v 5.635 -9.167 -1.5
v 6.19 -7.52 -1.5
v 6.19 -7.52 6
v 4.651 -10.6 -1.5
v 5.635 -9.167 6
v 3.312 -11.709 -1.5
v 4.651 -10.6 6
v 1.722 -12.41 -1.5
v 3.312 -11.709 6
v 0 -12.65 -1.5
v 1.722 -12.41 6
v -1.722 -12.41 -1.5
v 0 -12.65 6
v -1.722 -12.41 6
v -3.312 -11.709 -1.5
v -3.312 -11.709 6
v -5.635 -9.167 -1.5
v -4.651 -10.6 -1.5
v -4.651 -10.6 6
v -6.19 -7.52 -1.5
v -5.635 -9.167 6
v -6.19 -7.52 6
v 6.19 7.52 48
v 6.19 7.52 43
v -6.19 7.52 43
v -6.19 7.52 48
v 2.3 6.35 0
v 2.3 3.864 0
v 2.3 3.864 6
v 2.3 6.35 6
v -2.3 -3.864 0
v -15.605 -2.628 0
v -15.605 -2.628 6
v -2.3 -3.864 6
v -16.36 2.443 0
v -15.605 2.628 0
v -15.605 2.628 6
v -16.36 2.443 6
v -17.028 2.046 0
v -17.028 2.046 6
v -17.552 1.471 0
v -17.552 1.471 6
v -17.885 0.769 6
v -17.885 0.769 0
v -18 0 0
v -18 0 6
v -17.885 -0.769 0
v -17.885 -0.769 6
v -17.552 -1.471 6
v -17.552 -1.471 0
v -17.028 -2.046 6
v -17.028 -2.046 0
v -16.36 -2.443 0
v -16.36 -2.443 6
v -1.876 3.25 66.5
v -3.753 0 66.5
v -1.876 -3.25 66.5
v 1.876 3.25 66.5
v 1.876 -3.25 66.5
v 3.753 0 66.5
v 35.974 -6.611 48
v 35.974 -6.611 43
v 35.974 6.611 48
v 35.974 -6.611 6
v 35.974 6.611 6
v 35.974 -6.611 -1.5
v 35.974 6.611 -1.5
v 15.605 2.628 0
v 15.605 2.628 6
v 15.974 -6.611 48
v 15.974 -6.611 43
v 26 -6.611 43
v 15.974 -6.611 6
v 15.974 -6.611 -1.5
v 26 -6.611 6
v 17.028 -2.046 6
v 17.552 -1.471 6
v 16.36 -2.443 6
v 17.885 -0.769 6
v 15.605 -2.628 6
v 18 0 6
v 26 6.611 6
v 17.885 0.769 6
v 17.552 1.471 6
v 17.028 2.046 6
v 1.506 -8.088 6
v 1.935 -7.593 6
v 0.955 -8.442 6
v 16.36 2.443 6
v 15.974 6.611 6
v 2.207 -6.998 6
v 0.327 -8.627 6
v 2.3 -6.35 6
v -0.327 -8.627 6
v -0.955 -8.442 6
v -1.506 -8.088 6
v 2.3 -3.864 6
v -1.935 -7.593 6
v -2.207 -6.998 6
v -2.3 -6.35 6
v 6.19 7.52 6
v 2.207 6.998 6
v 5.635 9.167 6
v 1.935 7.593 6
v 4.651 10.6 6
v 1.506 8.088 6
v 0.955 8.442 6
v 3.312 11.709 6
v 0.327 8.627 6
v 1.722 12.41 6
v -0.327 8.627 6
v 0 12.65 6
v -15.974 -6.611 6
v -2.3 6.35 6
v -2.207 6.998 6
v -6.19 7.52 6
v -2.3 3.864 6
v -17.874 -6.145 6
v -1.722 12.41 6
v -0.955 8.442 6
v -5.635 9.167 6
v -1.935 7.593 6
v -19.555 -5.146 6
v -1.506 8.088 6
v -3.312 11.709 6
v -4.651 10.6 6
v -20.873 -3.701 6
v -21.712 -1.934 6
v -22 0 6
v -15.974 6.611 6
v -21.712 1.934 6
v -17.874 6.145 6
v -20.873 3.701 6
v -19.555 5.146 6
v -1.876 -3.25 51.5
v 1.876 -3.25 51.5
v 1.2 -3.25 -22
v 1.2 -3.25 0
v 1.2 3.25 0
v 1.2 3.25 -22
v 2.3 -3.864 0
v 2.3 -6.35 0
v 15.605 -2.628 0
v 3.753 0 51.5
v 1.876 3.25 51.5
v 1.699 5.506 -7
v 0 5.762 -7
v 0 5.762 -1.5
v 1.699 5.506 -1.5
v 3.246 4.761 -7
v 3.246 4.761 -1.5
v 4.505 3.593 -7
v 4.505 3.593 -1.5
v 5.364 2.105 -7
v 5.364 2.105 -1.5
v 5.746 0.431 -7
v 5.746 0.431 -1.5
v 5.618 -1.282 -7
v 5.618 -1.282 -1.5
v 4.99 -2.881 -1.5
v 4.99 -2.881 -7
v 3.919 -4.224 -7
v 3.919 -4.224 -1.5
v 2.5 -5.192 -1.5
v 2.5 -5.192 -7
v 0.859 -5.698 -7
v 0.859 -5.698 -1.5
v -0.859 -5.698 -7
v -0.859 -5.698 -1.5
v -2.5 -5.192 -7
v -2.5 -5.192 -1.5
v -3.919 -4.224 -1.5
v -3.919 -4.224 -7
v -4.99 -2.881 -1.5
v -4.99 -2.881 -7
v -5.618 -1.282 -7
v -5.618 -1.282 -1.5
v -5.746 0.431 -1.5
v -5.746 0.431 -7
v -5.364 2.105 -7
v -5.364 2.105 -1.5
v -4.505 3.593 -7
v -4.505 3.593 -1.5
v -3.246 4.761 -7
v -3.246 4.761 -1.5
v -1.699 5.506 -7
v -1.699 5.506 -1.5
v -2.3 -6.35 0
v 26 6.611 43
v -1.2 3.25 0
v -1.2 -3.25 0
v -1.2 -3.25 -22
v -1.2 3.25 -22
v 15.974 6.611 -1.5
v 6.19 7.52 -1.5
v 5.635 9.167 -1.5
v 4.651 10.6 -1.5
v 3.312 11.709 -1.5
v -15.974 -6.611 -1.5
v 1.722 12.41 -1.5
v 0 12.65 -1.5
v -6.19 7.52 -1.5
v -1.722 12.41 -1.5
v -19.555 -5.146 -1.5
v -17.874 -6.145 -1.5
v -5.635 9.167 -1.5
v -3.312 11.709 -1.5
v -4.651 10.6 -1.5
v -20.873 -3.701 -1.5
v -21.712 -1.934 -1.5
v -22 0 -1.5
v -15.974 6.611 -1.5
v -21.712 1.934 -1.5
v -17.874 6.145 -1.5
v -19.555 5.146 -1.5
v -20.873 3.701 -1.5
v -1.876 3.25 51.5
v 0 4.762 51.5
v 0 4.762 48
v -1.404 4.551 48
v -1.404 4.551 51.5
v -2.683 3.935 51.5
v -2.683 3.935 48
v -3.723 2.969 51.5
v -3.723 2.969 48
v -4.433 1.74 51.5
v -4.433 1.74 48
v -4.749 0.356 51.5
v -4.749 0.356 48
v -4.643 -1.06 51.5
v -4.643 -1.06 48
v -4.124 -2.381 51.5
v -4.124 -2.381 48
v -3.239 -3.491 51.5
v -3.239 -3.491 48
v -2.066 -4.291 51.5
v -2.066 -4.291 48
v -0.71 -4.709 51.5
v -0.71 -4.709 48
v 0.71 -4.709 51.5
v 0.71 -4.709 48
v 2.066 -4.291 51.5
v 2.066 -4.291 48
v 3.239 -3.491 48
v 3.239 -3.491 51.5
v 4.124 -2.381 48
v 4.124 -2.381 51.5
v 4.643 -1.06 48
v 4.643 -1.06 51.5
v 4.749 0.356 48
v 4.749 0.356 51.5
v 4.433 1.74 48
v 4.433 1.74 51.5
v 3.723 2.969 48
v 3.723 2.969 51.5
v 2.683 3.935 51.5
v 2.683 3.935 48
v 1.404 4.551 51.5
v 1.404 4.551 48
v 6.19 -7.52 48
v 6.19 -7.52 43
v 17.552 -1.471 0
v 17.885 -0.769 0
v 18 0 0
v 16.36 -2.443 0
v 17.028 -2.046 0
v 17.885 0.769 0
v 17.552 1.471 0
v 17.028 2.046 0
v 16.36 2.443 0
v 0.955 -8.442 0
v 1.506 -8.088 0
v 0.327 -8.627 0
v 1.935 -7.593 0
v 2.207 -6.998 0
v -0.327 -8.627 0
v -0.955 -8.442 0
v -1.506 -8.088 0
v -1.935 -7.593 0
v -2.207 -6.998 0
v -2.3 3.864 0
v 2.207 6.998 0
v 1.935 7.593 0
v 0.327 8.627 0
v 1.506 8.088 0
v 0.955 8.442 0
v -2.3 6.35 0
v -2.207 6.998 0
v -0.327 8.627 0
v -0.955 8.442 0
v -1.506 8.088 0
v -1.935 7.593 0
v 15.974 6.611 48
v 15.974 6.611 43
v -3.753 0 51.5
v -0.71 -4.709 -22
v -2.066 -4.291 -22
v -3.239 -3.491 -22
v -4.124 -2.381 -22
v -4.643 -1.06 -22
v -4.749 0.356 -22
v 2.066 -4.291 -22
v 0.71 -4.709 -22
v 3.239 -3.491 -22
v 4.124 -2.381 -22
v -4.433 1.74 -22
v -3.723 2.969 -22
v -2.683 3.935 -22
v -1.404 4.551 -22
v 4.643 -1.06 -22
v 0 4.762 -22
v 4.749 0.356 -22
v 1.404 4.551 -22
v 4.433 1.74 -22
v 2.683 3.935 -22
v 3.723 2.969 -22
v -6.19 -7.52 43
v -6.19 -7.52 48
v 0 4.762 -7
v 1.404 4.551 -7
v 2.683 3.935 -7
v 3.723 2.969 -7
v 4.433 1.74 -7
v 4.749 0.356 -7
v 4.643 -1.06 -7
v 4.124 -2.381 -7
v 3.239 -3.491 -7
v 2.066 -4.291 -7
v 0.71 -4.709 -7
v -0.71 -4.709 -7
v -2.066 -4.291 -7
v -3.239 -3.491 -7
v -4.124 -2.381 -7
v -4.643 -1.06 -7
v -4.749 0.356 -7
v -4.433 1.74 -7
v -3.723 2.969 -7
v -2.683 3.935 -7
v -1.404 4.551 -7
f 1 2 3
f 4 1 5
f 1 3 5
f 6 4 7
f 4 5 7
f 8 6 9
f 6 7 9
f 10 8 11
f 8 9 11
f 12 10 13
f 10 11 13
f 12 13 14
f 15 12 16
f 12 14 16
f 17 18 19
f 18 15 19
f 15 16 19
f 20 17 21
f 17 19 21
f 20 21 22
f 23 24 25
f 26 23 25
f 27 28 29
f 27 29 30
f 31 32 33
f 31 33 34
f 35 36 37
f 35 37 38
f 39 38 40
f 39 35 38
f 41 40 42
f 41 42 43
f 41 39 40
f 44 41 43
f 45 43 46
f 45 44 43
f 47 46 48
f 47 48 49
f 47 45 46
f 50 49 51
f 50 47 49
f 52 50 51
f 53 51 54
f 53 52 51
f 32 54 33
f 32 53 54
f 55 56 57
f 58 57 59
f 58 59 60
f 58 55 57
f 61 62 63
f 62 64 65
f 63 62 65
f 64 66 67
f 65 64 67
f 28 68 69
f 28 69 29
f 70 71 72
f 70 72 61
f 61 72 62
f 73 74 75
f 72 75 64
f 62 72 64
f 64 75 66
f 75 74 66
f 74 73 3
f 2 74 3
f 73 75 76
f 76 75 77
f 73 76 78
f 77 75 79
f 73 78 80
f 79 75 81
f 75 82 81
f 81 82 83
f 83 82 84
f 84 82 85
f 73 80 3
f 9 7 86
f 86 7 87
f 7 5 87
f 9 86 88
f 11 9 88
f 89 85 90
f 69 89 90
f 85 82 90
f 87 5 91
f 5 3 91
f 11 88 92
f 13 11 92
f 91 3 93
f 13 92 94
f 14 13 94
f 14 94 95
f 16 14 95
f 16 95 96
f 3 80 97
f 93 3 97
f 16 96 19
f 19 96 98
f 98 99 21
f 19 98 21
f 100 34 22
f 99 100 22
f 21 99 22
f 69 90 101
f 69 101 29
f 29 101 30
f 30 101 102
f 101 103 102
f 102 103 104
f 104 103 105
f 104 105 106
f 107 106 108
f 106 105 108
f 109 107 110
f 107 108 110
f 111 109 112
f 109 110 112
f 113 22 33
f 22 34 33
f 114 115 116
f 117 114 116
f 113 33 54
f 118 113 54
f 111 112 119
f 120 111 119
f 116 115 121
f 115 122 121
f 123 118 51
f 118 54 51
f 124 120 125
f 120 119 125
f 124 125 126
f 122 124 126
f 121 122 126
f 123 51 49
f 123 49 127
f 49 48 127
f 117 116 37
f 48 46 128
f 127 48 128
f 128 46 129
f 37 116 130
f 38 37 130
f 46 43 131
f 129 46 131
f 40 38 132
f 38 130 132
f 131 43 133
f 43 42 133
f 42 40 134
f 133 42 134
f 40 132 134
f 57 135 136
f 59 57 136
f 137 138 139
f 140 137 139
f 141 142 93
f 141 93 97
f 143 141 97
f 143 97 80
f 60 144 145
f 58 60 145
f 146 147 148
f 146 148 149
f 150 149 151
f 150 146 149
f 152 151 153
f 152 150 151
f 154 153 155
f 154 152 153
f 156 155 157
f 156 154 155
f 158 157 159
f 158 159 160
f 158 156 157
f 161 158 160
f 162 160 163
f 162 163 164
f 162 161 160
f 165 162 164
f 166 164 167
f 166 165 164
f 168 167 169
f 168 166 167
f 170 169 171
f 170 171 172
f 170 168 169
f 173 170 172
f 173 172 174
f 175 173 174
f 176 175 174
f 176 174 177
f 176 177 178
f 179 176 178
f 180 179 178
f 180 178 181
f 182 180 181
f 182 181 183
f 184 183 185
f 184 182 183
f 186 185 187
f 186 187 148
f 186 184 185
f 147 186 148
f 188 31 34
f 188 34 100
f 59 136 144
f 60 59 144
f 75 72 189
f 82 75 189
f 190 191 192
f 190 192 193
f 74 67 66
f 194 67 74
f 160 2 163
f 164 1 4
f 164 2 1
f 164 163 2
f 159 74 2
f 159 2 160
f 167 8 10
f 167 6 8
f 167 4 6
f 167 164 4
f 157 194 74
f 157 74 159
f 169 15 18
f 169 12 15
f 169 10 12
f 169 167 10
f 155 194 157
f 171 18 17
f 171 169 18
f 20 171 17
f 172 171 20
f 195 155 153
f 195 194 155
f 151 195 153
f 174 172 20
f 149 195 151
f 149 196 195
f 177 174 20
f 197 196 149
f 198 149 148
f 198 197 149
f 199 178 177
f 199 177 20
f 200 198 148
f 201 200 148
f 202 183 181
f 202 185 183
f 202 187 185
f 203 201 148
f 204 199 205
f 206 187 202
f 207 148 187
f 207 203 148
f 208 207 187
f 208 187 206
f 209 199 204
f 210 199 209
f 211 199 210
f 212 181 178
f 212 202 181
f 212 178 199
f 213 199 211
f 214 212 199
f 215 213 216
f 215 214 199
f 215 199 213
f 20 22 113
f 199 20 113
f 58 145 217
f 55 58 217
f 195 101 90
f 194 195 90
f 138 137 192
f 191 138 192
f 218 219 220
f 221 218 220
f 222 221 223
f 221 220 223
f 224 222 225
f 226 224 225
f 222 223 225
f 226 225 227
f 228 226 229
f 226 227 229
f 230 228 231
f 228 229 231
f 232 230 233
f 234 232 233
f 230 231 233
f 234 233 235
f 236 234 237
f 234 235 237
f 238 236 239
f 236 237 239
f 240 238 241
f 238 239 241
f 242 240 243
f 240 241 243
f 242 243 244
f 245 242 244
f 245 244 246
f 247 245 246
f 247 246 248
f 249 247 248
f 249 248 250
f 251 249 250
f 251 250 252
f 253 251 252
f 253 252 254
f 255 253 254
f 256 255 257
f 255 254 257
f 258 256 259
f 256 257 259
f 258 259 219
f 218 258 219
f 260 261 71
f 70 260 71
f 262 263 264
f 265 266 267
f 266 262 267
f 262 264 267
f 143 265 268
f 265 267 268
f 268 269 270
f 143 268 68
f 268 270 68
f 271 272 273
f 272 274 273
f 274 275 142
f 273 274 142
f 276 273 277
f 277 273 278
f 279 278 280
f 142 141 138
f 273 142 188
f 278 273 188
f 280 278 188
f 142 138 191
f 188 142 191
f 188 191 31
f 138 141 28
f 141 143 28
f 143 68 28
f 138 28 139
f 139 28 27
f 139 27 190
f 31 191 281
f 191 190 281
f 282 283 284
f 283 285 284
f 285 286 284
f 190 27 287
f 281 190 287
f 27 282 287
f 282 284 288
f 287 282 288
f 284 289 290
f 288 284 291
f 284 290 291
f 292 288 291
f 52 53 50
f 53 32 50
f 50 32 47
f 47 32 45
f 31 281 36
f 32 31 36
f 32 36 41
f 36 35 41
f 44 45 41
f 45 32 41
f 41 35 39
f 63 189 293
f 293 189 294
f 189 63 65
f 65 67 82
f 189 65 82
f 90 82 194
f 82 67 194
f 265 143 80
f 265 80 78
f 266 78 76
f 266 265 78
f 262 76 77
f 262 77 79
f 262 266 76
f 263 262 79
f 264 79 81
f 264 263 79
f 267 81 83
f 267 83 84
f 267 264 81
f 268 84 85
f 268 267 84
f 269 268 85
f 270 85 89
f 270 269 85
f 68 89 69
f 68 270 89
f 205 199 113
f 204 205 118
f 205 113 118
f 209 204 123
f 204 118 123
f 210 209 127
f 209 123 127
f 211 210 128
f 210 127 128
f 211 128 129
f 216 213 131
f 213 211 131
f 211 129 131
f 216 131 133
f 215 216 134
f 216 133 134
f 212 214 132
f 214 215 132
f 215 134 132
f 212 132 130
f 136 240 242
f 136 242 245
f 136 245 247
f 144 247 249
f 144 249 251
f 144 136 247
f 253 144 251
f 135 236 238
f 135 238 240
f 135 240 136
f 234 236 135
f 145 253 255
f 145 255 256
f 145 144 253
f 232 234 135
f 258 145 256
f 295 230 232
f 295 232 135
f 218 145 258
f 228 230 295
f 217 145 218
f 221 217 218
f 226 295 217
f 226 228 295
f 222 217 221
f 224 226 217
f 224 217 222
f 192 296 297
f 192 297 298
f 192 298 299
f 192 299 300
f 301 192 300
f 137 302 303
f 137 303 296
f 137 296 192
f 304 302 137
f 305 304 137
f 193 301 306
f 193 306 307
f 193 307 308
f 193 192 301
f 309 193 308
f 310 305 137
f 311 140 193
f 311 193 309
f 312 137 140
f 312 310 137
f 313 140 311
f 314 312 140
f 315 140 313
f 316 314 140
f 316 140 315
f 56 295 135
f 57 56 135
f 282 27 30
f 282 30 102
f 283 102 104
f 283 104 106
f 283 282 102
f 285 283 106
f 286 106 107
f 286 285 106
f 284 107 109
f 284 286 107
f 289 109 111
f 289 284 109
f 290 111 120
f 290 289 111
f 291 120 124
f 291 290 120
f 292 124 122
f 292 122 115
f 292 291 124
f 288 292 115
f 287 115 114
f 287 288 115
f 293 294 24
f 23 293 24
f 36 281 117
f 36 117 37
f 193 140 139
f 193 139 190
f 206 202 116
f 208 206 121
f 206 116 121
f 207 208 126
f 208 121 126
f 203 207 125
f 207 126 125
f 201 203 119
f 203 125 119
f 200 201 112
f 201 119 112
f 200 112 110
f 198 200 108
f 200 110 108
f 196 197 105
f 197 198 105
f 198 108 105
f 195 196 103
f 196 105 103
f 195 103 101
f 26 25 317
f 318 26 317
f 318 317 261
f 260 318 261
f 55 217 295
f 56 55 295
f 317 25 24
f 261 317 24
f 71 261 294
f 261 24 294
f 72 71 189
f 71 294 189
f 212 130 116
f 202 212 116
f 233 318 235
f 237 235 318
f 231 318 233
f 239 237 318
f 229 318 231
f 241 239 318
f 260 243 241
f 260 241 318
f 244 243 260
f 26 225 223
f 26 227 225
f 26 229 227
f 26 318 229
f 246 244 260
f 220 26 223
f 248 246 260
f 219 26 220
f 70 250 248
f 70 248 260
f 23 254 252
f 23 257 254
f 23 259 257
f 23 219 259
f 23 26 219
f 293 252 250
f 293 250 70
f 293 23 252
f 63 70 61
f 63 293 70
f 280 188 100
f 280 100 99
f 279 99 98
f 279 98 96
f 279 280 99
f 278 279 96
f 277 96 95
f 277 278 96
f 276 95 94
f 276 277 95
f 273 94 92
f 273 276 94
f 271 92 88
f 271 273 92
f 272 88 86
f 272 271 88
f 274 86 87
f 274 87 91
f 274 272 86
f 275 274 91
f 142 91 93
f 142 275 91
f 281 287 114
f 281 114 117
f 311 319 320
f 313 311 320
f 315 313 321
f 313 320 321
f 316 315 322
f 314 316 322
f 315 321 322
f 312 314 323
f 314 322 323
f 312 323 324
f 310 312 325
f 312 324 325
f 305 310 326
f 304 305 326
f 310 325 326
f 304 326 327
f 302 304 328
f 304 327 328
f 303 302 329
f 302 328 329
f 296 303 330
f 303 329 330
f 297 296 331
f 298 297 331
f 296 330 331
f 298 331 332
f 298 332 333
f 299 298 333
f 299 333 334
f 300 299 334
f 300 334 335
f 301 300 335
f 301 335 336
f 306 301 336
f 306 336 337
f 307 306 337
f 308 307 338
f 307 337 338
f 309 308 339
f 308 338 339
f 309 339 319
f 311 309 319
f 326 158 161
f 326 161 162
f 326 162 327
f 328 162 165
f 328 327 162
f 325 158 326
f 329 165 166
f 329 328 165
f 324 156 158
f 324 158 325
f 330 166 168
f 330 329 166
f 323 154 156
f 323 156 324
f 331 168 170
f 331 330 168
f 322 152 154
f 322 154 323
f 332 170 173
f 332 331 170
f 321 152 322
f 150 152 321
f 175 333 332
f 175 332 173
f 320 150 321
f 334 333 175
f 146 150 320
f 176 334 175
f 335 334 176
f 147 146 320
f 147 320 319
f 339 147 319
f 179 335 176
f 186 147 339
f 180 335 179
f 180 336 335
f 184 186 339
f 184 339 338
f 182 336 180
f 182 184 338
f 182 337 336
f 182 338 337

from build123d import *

# Parameters (mm, degrees)
BOSS_EXTRUDE1_DEPTH = 6
BOSS_EXTRUDE2_DEPTH = 7
SKETCH4_R           = 4.7625
BOSS_EXTRUDE3_DEPTH = 15
CUT_EXTRUDE1_REACH  = 30
SKETCH5_W           = 2.4
SKETCH5_H           = 6.5
SKETCH8_W           = 9.974420143
SKETCH8_H           = 13.222039712
BOSS_EXTRUDE4_DEPTH = 37
BOSS_EXTRUDE5_DEPTH = 5
SKETCH12_R          = 4.7625
BOSS_EXTRUDE6_DEPTH = 3.5
BOSS_EXTRUDE7_DEPTH = 15
SKETCH14_W          = 83.87720003
SKETCH14_H          = 67.677452278
SKETCH14_R          = 5.7625
CUT_EXTRUDE2_DEPTH  = 5.5


with BuildPart() as part:
    # Sketch2 → Boss-Extrude1 (new body)
    with BuildSketch(Plane.XY):
        with BuildLine():
            Line((15.974420143, 6.611019856), (35.974420143, 6.611019856))
            Line((35.974420143, 6.611019856), (35.974420143, -6.611019856))
            Line((35.974420143, -6.611019856), (15.974420143, -6.611019856))
            Line((15.974420143, -6.611019856), (6.190493175, -7.51952736))
            ThreePointArc((6.190493175, -7.51952736), (0, -12.65), (-6.190493175, -7.51952736))
            Line((-6.190493175, -7.51952736), (-15.974420143, -6.611019856))
            ThreePointArc((-15.974420143, -6.611019856), (-22, 0), (-15.974420143, 6.611019856))
            Line((-15.974420143, 6.611019856), (-6.190493175, 7.51952736))
            ThreePointArc((-6.190493175, 7.51952736), (0, 12.65), (6.190493175, 7.51952736))
            Line((6.190493175, 7.51952736), (15.974420143, 6.611019856))
        make_face()
        with BuildLine():
            Line((15.604582602, 2.62815403), (2.3, 3.863579557))
            Line((2.3, 3.863579557), (2.3, 6.35))
            ThreePointArc((2.3, 6.35), (0, 8.65), (-2.3, 6.35))
            Line((-2.3, 6.35), (-2.3, 3.863579557))
            Line((-2.3, 3.863579557), (-15.604582602, 2.62815403))
            ThreePointArc((-15.604582602, 2.62815403), (-18, 0), (-15.604582602, -2.62815403))
            Line((-15.604582602, -2.62815403), (-2.3, -3.863579557))
            Line((-2.3, -3.863579557), (-2.3, -6.35))
            ThreePointArc((-2.3, -6.35), (0, -8.65), (2.3, -6.35))
            Line((2.3, -6.35), (2.3, -3.863579557))
            Line((2.3, -3.863579557), (15.604582602, -2.62815403))
            ThreePointArc((15.604582602, -2.62815403), (18, 0), (15.604582602, 2.62815403))
        make_face(mode=Mode.SUBTRACT)
    extrude(amount=BOSS_EXTRUDE1_DEPTH)

    # Sketch3 → Boss-Extrude2 (add)
    with BuildSketch(Plane(origin=(0, 0, 0), x_dir=(-1, 0, 0), z_dir=(0, 0, -1))):
        with BuildLine():
            Line((-15.974420143, -6.611019856), (-6.190493175, -7.51952736))
            ThreePointArc((-6.190493175, -7.51952736), (0, -12.65), (6.190493175, -7.51952736))
            Line((6.190493175, -7.51952736), (15.974420143, -6.611019856))
            ThreePointArc((15.974420143, -6.611019856), (22, 0), (15.974420143, 6.611019856))
            Line((15.974420143, 6.611019856), (6.190493175, 7.51952736))
            ThreePointArc((6.190493175, 7.51952736), (0, 12.65), (-6.190493175, 7.51952736))
            Line((-6.190493175, 7.51952736), (-15.974420143, 6.611019856))
            Line((-15.974420143, 6.611019856), (-35.974420143, 6.611019856))
            Line((-35.974420143, 6.611019856), (-35.974420143, -6.611019856))
            Line((-35.974420143, -6.611019856), (-15.974420143, -6.611019856))
        make_face()
    extrude(amount=BOSS_EXTRUDE2_DEPTH)

    # Sketch4 → Boss-Extrude3 (add)
    with BuildSketch(Plane(origin=(0, 0, -7), x_dir=(-1, 0, 0), z_dir=(0, 0, -1))):
        with Locations(Location((0, 0, 0), (0, 0, 90))):  # turned: the seam where the file's is
            Circle(SKETCH4_R)
    extrude(amount=BOSS_EXTRUDE3_DEPTH)

    # Sketch5 → Cut-Extrude1 (cut, up to next)
    with BuildSketch(Plane(origin=(0, 0, -22), x_dir=(-1, 0, 0), z_dir=(0, 0, -1)), mode=Mode.PRIVATE) as cut_extrude1_sk1:
        Rectangle(SKETCH5_W, SKETCH5_H)
    cut_extrude1_tool1 = extrude(cut_extrude1_sk1.sketch, amount=-CUT_EXTRUDE1_REACH, mode=Mode.PRIVATE) & part.part
    add(cut_extrude1_tool1.solids().sort_by_distance((0, 0, -22))[0], mode=Mode.SUBTRACT)

    # Sketch8 → Boss-Extrude4 (add)
    with BuildSketch(Plane.XY.offset(6)):
        with Locations((30.987210072, 0)):
            Rectangle(SKETCH8_W, SKETCH8_H)
    extrude(amount=BOSS_EXTRUDE4_DEPTH)

    # Sketch10 → Boss-Extrude5 (add)
    with BuildSketch(Plane.XY.offset(43)):
        Polygon((35.974420143, 6.611019856), (15.974420143, 6.611019856), (6.190493175, 7.51952736), (-6.190493175, 7.51952736), (-6.190493175, -7.51952736), (6.190493175, -7.51952736), (15.974420143, -6.611019856), (35.974420143, -6.611019856), align=None)
    extrude(amount=BOSS_EXTRUDE5_DEPTH)

    # Sketch12 → Boss-Extrude6 (add)
    with BuildSketch(Plane.XY.offset(48)):
        with Locations(Location((0, 0, 0), (0, 0, 90))):  # turned: the seam where the file's is
            Circle(SKETCH12_R)
    extrude(amount=BOSS_EXTRUDE6_DEPTH)

    # Sketch13 → Boss-Extrude7 (add)
    with BuildSketch(Plane.XY.offset(51.5)):
        Polygon((3.75277675, 0), (1.876388375, 3.25), (-1.876388375, 3.25), (-3.75277675, 0), (-1.876388375, -3.25), (1.876388375, -3.25), align=None)
    extrude(amount=BOSS_EXTRUDE7_DEPTH)

    # Sketch14 → Cut-Extrude2 (cut)
    with BuildSketch(Plane(origin=(0, 0, -7), x_dir=(-1, 0, 0), z_dir=(0, 0, -1))):
        with Locations((-8.599932489, 1.250992594)):
            Rectangle(SKETCH14_W, SKETCH14_H)
        with BuildLine():
            Line((-35.974420143, -6.611019856), (-15.974420143, -6.611019856))
            Line((-15.974420143, -6.611019856), (-6.190493175, -7.51952736))
            ThreePointArc((-6.190493175, -7.51952736), (0, -12.65), (6.190493175, -7.51952736))
            Line((6.190493175, -7.51952736), (15.974420143, -6.611019856))
            ThreePointArc((15.974420143, -6.611019856), (22, 0), (15.974420143, 6.611019856))
            Line((15.974420143, 6.611019856), (6.190493175, 7.51952736))
            ThreePointArc((6.190493175, 7.51952736), (0, 12.65), (-6.190493175, 7.51952736))
            Line((-6.190493175, 7.51952736), (-15.974420143, 6.611019856))
            Line((-15.974420143, 6.611019856), (-35.974420143, 6.611019856))
            Line((-35.974420143, 6.611019856), (-35.974420143, -6.611019856))
        make_face(mode=Mode.SUBTRACT)
        with BuildLine():
            Line((-35.974420143, 6.611019856), (-35.974420143, -6.611019856))
            Line((-35.974420143, -6.611019856), (-15.974420143, -6.611019856))
            Line((-15.974420143, -6.611019856), (-6.190493175, -7.51952736))
            ThreePointArc((-6.190493175, -7.51952736), (0, -12.65), (6.190493175, -7.51952736))
            Line((6.190493175, -7.51952736), (15.974420143, -6.611019856))
            ThreePointArc((15.974420143, -6.611019856), (22, 0), (15.974420143, 6.611019856))
            Line((15.974420143, 6.611019856), (6.190493175, 7.51952736))
            ThreePointArc((6.190493175, 7.51952736), (0, 12.65), (-6.190493175, 7.51952736))
            Line((-6.190493175, 7.51952736), (-15.974420143, 6.611019856))
            Line((-15.974420143, 6.611019856), (-35.974420143, 6.611019856))
        make_face()
        with Locations(Location((0, 0, 0), (0, 0, 90))):  # turned: the seam where the file's is
            Circle(SKETCH14_R, mode=Mode.SUBTRACT)
    extrude(amount=-CUT_EXTRUDE2_DEPTH, mode=Mode.SUBTRACT)


solid = part.part
